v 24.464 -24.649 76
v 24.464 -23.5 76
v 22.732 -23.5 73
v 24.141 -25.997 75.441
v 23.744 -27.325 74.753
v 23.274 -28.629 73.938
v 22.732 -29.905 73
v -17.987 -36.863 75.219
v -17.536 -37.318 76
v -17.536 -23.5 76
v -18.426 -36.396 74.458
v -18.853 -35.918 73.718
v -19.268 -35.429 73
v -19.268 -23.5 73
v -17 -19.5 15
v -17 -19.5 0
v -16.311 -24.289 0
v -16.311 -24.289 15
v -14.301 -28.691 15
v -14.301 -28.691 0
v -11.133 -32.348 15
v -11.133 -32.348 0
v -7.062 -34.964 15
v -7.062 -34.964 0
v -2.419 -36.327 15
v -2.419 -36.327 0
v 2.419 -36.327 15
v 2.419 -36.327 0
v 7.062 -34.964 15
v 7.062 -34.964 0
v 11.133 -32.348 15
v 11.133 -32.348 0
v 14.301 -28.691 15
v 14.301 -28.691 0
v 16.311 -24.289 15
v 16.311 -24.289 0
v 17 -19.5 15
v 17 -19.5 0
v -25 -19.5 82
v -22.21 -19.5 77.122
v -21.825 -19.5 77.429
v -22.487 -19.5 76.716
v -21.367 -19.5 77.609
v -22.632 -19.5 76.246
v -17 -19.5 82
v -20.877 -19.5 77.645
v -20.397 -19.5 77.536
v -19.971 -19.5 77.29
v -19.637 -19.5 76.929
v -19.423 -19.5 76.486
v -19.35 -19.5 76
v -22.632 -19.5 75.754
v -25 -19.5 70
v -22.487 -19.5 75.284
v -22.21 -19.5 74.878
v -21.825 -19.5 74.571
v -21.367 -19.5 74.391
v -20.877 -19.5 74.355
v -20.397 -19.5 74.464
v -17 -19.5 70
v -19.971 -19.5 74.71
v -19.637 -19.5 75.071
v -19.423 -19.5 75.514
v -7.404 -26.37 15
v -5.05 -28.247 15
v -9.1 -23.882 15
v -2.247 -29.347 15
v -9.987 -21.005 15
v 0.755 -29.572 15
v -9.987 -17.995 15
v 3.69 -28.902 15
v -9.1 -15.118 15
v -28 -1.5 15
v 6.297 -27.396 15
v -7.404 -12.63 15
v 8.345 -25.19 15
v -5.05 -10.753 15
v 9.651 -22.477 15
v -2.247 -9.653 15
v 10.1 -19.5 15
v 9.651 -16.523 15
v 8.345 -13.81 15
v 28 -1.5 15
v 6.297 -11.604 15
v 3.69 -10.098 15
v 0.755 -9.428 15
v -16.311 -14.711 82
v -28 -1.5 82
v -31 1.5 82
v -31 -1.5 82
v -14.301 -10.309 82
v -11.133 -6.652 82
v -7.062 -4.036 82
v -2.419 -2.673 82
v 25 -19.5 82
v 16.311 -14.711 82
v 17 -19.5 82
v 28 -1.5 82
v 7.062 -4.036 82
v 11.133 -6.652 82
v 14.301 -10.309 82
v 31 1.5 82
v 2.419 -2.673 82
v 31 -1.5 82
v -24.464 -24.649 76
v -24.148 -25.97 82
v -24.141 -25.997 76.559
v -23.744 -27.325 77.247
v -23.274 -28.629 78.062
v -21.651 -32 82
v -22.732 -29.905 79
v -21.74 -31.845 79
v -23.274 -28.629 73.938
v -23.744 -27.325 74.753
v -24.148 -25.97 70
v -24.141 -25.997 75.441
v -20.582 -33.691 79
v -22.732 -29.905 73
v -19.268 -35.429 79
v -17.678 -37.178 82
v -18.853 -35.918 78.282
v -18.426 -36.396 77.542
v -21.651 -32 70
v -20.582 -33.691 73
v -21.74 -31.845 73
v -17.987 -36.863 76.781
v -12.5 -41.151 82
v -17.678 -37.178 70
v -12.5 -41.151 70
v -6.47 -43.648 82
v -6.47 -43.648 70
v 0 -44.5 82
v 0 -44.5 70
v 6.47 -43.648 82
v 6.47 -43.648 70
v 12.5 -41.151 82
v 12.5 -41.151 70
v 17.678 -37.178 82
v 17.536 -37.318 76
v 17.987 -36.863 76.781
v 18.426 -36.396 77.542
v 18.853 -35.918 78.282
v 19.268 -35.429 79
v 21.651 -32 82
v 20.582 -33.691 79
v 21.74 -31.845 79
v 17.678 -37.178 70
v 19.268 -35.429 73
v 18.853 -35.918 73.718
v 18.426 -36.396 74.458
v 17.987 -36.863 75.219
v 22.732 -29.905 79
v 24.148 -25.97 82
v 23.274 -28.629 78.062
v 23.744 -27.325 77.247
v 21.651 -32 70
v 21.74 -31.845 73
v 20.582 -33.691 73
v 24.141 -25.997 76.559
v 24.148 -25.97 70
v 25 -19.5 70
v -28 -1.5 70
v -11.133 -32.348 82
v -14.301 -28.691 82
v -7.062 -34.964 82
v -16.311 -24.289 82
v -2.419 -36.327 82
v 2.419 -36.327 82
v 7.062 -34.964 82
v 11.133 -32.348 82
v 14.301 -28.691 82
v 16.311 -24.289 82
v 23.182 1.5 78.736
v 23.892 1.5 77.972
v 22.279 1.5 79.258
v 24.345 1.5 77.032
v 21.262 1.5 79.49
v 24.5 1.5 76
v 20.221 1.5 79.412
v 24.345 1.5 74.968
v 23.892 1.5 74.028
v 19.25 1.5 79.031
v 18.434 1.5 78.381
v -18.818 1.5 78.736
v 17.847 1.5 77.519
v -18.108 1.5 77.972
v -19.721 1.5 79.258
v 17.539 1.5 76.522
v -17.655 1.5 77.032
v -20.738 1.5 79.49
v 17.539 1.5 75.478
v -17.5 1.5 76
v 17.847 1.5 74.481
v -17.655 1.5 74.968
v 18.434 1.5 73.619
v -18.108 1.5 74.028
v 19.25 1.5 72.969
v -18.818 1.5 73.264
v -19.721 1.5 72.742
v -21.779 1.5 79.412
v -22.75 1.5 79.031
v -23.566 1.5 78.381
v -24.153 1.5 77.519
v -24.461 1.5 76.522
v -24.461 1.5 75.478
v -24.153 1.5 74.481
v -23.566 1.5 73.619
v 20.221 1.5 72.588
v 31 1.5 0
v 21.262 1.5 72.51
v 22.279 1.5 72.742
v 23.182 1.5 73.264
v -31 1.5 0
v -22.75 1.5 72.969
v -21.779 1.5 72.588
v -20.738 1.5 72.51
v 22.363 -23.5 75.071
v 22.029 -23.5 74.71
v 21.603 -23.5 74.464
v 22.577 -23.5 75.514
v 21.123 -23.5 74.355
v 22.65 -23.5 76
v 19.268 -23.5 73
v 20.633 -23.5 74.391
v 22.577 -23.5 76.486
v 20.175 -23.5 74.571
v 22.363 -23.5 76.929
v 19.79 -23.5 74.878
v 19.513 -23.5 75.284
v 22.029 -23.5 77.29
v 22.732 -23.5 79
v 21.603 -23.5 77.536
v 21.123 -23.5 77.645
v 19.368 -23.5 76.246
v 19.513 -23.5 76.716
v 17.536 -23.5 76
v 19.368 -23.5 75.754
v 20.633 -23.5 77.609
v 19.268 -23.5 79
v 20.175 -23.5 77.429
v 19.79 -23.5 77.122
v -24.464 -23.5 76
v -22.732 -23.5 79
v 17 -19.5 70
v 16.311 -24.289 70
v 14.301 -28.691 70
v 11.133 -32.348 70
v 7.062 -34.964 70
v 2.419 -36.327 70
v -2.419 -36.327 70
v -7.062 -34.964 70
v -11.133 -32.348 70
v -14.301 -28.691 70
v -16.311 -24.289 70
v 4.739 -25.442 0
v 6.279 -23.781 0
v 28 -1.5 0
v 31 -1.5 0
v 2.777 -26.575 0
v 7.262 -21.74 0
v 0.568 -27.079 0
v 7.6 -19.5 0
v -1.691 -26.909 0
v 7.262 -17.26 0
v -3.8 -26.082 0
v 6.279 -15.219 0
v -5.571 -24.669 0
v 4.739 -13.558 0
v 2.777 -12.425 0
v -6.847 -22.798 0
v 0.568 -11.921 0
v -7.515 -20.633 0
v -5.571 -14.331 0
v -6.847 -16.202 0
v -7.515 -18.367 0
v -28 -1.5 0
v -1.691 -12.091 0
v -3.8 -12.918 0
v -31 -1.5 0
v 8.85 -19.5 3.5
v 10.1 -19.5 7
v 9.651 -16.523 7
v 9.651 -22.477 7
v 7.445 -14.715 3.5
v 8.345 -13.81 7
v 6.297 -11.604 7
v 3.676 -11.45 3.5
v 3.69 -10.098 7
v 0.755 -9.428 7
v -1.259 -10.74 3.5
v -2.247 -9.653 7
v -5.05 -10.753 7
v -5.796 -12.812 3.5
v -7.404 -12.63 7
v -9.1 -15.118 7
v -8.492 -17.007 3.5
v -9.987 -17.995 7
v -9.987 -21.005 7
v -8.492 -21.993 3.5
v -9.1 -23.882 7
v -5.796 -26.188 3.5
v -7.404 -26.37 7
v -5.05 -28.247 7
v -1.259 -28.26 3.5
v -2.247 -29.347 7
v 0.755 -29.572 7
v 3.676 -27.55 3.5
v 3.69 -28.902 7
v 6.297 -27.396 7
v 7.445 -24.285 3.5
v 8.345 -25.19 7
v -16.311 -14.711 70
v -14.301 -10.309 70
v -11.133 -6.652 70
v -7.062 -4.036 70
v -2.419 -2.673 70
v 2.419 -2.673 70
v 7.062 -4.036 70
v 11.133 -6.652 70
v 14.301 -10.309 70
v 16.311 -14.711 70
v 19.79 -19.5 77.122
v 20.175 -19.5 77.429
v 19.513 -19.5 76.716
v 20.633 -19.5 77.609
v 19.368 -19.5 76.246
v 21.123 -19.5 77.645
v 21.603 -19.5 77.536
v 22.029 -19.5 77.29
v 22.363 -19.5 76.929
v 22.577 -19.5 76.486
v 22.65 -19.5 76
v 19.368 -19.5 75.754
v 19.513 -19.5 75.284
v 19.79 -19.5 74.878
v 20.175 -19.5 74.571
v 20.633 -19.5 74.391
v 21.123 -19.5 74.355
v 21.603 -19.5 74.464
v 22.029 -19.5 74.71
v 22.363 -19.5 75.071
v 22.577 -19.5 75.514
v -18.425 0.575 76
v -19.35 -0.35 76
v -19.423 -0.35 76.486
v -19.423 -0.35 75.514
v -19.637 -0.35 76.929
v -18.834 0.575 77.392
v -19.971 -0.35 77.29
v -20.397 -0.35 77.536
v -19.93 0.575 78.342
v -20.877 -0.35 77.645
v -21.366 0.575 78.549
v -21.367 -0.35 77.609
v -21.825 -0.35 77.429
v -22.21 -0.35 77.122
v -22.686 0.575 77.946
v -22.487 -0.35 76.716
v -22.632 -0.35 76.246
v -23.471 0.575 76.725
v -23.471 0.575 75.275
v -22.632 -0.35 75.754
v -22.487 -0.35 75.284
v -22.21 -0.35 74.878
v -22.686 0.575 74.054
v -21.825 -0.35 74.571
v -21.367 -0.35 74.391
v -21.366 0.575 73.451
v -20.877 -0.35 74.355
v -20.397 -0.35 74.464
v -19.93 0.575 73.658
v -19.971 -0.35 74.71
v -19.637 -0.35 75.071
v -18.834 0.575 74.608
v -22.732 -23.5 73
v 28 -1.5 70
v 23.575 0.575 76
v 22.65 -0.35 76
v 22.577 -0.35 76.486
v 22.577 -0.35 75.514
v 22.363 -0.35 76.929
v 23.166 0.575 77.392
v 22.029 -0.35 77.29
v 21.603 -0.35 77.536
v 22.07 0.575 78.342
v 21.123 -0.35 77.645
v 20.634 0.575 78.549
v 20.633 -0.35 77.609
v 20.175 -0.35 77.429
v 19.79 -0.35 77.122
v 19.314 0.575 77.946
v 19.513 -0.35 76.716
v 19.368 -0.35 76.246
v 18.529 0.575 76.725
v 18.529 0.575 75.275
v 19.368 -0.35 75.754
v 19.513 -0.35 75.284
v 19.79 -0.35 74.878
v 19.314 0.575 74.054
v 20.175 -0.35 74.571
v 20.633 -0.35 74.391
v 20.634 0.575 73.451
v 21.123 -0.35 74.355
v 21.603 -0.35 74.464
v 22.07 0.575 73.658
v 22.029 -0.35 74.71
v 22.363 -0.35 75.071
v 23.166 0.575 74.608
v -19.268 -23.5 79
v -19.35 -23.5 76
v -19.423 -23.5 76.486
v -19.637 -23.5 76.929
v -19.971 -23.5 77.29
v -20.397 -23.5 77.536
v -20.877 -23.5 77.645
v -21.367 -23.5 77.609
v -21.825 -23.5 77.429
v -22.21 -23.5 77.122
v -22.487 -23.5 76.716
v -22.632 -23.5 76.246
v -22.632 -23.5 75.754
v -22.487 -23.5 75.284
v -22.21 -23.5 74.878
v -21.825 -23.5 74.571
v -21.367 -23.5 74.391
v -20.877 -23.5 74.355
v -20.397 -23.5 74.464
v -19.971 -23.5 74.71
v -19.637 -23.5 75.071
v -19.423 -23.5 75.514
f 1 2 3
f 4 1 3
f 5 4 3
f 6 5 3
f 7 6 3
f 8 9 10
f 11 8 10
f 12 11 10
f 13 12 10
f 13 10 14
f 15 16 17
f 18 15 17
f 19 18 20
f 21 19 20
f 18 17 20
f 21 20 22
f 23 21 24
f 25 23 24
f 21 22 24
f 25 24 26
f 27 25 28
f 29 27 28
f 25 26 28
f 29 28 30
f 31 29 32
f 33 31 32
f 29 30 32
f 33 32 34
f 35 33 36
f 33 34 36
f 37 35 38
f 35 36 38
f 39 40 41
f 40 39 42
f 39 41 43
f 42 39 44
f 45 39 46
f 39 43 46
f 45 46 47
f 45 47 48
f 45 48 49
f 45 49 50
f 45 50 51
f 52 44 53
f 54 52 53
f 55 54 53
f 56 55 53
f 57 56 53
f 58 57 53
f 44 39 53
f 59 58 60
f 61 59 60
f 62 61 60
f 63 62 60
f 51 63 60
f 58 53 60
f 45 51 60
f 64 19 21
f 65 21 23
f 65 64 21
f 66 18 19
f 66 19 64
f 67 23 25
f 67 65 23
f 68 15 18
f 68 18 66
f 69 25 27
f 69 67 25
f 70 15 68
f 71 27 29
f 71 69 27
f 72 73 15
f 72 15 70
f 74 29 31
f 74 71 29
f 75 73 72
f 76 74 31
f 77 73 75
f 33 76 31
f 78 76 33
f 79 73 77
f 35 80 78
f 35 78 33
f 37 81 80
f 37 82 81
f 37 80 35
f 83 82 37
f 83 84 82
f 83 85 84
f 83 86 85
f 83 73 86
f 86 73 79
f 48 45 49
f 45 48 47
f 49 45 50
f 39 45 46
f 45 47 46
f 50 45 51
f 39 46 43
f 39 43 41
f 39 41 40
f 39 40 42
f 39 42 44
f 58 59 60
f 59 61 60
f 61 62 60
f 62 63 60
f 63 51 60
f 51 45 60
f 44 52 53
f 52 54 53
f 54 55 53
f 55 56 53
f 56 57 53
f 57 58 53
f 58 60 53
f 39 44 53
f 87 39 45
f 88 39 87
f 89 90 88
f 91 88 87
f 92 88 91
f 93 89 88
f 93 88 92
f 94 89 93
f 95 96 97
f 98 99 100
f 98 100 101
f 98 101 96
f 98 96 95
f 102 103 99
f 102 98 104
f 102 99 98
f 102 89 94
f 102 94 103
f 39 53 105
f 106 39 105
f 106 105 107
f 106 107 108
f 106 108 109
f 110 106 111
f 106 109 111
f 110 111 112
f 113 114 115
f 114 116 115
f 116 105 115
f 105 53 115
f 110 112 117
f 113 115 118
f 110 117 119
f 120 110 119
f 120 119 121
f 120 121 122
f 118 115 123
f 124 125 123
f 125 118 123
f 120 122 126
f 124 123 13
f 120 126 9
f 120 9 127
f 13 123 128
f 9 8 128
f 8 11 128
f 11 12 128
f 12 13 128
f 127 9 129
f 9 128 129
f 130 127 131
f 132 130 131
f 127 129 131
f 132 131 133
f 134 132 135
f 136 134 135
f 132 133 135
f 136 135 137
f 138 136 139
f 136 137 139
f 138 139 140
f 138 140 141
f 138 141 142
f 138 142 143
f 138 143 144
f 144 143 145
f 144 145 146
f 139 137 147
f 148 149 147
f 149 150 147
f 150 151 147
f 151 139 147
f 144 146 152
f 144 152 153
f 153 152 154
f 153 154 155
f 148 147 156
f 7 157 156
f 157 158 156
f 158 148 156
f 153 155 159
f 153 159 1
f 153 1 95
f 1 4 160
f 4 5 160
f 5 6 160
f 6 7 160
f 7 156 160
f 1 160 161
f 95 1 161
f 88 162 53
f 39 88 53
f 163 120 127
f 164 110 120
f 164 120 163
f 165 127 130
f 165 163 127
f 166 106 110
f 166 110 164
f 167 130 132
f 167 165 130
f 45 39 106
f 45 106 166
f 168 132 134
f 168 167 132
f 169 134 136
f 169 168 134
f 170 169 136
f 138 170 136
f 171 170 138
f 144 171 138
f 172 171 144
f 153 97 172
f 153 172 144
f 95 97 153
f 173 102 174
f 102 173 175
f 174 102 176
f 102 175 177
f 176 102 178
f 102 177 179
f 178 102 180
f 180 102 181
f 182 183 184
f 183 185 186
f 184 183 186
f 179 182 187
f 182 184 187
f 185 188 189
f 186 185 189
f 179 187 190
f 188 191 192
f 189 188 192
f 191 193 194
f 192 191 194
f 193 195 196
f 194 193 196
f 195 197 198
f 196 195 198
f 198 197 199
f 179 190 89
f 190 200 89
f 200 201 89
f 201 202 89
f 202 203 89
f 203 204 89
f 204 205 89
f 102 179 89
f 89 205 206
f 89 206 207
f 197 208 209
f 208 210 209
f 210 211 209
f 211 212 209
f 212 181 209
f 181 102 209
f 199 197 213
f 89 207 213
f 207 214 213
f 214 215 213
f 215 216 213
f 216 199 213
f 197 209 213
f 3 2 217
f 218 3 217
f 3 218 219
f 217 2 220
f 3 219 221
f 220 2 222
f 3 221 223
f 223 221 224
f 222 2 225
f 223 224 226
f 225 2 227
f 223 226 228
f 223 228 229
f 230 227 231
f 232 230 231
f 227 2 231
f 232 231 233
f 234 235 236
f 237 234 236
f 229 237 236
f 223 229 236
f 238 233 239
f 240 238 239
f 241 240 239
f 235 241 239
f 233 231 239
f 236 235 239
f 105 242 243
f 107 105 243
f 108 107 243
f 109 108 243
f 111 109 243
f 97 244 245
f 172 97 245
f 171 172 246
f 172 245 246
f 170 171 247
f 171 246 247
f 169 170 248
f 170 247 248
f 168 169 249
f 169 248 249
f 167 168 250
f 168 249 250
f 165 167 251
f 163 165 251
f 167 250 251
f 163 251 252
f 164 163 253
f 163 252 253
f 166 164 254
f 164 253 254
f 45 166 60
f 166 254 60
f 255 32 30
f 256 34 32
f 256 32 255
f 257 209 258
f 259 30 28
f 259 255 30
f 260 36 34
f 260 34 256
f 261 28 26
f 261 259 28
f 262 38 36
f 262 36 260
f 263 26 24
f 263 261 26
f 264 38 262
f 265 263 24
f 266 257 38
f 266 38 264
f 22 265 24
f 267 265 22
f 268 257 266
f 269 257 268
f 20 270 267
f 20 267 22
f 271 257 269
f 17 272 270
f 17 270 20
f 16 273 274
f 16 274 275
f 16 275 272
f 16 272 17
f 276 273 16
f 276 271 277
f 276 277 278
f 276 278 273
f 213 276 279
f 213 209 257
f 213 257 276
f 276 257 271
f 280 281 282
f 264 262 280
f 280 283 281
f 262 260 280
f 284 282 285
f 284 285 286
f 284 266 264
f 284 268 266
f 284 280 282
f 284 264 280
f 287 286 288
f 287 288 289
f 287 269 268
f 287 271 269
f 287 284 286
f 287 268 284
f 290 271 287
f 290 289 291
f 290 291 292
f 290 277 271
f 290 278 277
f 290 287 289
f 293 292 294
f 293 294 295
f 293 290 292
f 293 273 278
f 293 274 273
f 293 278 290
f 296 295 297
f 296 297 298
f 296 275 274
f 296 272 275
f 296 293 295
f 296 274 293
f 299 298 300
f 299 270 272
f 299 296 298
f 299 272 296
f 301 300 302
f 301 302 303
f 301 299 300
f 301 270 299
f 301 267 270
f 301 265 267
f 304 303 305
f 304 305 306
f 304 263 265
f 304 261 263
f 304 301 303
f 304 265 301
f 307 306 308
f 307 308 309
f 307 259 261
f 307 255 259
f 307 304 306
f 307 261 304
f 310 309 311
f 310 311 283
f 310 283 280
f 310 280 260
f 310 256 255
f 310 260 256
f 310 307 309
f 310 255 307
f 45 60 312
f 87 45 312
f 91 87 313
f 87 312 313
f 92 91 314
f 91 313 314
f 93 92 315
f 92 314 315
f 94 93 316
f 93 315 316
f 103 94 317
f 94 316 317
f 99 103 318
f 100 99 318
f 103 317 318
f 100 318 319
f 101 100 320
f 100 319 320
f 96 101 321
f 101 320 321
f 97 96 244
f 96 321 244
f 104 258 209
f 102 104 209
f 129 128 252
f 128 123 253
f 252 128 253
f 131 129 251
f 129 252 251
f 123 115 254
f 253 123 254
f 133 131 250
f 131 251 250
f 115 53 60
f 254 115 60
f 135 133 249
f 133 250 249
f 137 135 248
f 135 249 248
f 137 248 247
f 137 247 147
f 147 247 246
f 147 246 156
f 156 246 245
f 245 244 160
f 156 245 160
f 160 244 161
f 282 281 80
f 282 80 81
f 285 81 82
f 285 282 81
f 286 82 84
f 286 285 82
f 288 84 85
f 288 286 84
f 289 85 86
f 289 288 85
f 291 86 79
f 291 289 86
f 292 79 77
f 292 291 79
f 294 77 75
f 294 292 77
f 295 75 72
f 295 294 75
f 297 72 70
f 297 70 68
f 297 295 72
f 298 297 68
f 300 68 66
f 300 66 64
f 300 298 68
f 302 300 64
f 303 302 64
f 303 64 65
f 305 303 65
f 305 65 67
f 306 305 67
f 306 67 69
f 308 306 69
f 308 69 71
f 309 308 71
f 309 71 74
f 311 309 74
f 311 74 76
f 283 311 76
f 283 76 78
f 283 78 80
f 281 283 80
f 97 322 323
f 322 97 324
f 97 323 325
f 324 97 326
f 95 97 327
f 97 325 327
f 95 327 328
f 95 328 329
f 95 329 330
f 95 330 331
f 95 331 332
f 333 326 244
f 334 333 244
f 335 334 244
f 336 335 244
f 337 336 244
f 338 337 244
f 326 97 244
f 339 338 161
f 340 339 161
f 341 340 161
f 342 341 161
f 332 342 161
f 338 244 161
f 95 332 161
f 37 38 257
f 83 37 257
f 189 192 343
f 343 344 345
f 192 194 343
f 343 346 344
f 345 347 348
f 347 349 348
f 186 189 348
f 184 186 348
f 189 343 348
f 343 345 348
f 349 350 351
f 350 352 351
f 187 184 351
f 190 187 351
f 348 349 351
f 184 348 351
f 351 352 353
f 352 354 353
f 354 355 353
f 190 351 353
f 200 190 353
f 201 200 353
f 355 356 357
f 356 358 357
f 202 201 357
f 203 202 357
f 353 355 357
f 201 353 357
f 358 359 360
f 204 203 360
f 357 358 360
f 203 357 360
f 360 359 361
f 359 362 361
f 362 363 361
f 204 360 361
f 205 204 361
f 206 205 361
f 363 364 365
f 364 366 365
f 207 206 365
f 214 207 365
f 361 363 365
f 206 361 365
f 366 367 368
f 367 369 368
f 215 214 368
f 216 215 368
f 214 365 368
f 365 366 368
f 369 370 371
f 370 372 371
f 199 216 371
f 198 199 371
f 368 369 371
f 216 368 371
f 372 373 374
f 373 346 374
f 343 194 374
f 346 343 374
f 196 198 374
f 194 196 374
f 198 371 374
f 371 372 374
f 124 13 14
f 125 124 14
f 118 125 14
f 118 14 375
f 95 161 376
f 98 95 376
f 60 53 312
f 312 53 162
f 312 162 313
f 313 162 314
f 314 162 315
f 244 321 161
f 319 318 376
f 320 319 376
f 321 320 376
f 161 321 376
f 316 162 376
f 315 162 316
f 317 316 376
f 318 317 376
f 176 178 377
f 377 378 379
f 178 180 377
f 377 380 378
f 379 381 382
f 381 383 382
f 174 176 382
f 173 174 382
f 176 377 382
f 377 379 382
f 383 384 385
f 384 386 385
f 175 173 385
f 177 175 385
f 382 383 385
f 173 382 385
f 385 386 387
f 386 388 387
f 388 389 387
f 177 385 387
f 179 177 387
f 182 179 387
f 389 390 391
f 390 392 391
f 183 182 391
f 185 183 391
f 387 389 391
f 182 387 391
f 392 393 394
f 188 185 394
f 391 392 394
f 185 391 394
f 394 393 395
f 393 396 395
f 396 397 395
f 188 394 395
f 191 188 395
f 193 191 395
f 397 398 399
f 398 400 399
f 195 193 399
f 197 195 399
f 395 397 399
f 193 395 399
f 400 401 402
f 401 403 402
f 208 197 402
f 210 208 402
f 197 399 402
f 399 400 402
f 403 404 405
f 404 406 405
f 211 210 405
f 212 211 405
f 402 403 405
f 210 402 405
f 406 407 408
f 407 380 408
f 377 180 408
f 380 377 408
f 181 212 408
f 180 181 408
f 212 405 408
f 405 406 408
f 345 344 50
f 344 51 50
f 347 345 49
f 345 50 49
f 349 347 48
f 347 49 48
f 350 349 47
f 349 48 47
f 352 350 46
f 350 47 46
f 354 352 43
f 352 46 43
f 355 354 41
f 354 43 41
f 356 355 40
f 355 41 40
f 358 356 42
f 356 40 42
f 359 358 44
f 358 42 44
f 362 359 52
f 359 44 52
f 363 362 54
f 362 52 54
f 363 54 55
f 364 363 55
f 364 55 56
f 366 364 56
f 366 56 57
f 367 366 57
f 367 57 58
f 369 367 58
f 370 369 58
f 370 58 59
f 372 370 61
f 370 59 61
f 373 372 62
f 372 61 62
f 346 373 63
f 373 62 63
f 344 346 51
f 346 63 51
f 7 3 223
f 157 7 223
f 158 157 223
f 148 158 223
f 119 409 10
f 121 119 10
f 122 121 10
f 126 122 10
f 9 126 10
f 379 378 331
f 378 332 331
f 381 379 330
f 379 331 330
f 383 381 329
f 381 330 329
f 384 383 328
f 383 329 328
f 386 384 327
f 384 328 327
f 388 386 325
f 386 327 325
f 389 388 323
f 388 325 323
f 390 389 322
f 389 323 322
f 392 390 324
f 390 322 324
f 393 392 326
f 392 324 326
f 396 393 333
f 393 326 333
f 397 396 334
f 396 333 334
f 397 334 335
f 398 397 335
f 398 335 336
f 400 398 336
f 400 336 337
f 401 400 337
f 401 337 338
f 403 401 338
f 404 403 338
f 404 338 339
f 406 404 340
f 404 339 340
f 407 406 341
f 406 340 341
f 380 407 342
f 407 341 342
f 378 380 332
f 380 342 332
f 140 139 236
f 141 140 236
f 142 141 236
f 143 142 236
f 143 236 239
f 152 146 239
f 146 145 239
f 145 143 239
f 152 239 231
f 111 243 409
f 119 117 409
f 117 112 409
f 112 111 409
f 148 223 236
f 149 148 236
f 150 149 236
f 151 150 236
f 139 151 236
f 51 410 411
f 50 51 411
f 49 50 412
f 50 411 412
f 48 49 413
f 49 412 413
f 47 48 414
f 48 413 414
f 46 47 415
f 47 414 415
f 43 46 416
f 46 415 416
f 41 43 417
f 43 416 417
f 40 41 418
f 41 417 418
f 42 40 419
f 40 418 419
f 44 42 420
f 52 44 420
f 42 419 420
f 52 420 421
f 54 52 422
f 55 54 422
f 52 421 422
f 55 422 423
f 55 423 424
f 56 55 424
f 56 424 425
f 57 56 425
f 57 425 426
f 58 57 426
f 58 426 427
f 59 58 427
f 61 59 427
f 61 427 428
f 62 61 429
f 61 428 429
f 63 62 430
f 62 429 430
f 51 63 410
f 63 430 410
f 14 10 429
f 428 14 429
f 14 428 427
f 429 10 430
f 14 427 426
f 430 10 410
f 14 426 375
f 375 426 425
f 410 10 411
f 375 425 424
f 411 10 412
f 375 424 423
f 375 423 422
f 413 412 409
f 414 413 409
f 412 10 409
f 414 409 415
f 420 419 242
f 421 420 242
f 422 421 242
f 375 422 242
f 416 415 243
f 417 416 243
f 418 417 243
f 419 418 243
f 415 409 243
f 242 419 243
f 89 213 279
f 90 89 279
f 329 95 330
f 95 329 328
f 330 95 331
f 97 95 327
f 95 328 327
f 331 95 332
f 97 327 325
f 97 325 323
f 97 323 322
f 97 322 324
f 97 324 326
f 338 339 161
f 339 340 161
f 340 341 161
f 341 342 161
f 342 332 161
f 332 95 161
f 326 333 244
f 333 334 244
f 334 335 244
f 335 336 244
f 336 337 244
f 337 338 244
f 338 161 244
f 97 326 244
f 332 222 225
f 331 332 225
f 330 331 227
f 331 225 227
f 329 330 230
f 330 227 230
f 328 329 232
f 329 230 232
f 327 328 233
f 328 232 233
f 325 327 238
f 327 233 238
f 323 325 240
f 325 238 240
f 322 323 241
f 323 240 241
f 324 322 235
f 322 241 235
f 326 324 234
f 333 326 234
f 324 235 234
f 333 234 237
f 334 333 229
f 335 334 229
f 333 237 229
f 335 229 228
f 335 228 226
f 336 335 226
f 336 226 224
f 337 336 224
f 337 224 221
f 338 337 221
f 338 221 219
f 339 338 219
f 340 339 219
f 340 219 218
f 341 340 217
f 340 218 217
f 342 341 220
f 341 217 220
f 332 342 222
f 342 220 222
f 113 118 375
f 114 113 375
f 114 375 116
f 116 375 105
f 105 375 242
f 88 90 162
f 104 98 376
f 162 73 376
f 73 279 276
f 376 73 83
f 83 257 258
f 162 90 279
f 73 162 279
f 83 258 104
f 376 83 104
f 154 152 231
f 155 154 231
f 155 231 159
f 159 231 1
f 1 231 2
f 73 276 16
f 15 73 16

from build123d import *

# Parameters (mm, degrees)
F1_DEPTH         = 82
F2_START         = 70
F2_DEPTH         = 12
F3_START         = 70
F3_DEPTH         = 12
F5_D             = 3.3
F5_CSINK_D       = 7
F5_CSINK_ANGLE   = 90
F5_2_D           = 3.3
F5_2_CSINK_D     = 7
F5_2_CSINK_ANGLE = 90
F6_START         = -25
F6_DEPTH         = 25
F0_R             = 10.1
F8_DEPTH         = 15


with BuildPart() as f1:
    # F0 (on Top) → F1 (new body)
    with BuildSketch(Plane.XY):
        Polygon((28, -1.5), (31, -1.5), (31, 1.5), (-31, 1.5), (-31, -1.5), (-28, -1.5), align=None)
    extrude(amount=F1_DEPTH)

    # F0 (on Top) → F2 (join)
    with BuildSketch(Plane.XY.offset(F2_START)):
        with BuildLine():
            Line((17, -19.5), (28, -1.5))
            Line((28, -1.5), (-28, -1.5))
            Line((-28, -1.5), (-17, -19.5))
            ThreePointArc((-17, -19.5), (0, -2.5), (17, -19.5))
        make_face()
        Polygon((25, -19.5), (28, -1.5), (17, -19.5), align=None)
        Polygon((-17, -19.5), (-28, -1.5), (-25, -19.5), align=None)
    extrude(amount=F2_DEPTH)

    # F5 (through all)
    with Locations(Plane(origin=(0, 1.5, 0), x_dir=(-1, 0, 0), z_dir=(0, 1, 0))):
        with Locations((-21, 76), (21, 76)):
            CounterSinkHole(F5_D / 2, F5_CSINK_D / 2, counter_sink_angle=F5_CSINK_ANGLE)

    # F0 (on Top) → F8 (join)
    with BuildSketch(Plane.XY):
        with BuildLine():
            ThreePointArc((-17, -19.5), (0, -36.5), (17, -19.5))
            ThreePointArc((17, -19.5), (0, -2.5), (-17, -19.5))
        make_face()
        with Locations((0, -19.5)):
            Circle(F0_R, mode=Mode.SUBTRACT)
        with BuildLine():
            Line((17, -19.5), (28, -1.5))
            Line((28, -1.5), (-28, -1.5))
            Line((-28, -1.5), (-17, -19.5))
            ThreePointArc((-17, -19.5), (0, -2.5), (17, -19.5))
        make_face()
    extrude(amount=F8_DEPTH)

    # F9 (on offset) → F10 (revolve)
    with BuildSketch(Plane.XZ.offset(19.5)):
        Polygon((10.1, 7), (7.6, 0), (10.1, 0), align=None)
    revolve(axis=Axis((0, -19.5, 3.5), (0, 0, 1)))


with BuildPart() as f3:
    # F0 (on Top) → F3 (new body)
    with BuildSketch(Plane.XY.offset(F3_START)):
        with BuildLine():
            ThreePointArc((-25, -19.5), (0, -44.5), (25, -19.5))
            Line((25, -19.5), (17, -19.5))
            ThreePointArc((17, -19.5), (0, -36.5), (-17, -19.5))
            Line((-17, -19.5), (-25, -19.5))
        make_face()
    extrude(amount=F3_DEPTH)

    # F5#2 (through all)
    with Locations(Plane(origin=(0, 1.5, 0), x_dir=(-1, 0, 0), z_dir=(0, 1, 0))):
        with Locations((-21, 76), (21, 76)):
            CounterSinkHole(F5_2_D / 2, F5_2_CSINK_D / 2, counter_sink_angle=F5_2_CSINK_ANGLE)

    # F4 (on face) → F6 (cut)
    with BuildSketch(Plane(origin=(0, 1.5, 0), x_dir=(-1, 0, 0), z_dir=(0, 1, 0)).offset(F6_START)):
        Polygon((-19.2679491924, 79), (-21, 79), (-22.7320508076, 79), (-24.4641016151, 76), (-22.7320508076, 73), (-19.2679491924, 73), (-17.5358983849, 76), align=None)
        Polygon((19.2679491924, 79), (17.5358983849, 76), (19.2679491924, 73), (22.7320508076, 73), (24.4641016151, 76), (22.7320508076, 79), (21, 79), align=None)
    extrude(amount=-F6_DEPTH, mode=Mode.SUBTRACT)


solid = Compound([f1.part, f3.part])
